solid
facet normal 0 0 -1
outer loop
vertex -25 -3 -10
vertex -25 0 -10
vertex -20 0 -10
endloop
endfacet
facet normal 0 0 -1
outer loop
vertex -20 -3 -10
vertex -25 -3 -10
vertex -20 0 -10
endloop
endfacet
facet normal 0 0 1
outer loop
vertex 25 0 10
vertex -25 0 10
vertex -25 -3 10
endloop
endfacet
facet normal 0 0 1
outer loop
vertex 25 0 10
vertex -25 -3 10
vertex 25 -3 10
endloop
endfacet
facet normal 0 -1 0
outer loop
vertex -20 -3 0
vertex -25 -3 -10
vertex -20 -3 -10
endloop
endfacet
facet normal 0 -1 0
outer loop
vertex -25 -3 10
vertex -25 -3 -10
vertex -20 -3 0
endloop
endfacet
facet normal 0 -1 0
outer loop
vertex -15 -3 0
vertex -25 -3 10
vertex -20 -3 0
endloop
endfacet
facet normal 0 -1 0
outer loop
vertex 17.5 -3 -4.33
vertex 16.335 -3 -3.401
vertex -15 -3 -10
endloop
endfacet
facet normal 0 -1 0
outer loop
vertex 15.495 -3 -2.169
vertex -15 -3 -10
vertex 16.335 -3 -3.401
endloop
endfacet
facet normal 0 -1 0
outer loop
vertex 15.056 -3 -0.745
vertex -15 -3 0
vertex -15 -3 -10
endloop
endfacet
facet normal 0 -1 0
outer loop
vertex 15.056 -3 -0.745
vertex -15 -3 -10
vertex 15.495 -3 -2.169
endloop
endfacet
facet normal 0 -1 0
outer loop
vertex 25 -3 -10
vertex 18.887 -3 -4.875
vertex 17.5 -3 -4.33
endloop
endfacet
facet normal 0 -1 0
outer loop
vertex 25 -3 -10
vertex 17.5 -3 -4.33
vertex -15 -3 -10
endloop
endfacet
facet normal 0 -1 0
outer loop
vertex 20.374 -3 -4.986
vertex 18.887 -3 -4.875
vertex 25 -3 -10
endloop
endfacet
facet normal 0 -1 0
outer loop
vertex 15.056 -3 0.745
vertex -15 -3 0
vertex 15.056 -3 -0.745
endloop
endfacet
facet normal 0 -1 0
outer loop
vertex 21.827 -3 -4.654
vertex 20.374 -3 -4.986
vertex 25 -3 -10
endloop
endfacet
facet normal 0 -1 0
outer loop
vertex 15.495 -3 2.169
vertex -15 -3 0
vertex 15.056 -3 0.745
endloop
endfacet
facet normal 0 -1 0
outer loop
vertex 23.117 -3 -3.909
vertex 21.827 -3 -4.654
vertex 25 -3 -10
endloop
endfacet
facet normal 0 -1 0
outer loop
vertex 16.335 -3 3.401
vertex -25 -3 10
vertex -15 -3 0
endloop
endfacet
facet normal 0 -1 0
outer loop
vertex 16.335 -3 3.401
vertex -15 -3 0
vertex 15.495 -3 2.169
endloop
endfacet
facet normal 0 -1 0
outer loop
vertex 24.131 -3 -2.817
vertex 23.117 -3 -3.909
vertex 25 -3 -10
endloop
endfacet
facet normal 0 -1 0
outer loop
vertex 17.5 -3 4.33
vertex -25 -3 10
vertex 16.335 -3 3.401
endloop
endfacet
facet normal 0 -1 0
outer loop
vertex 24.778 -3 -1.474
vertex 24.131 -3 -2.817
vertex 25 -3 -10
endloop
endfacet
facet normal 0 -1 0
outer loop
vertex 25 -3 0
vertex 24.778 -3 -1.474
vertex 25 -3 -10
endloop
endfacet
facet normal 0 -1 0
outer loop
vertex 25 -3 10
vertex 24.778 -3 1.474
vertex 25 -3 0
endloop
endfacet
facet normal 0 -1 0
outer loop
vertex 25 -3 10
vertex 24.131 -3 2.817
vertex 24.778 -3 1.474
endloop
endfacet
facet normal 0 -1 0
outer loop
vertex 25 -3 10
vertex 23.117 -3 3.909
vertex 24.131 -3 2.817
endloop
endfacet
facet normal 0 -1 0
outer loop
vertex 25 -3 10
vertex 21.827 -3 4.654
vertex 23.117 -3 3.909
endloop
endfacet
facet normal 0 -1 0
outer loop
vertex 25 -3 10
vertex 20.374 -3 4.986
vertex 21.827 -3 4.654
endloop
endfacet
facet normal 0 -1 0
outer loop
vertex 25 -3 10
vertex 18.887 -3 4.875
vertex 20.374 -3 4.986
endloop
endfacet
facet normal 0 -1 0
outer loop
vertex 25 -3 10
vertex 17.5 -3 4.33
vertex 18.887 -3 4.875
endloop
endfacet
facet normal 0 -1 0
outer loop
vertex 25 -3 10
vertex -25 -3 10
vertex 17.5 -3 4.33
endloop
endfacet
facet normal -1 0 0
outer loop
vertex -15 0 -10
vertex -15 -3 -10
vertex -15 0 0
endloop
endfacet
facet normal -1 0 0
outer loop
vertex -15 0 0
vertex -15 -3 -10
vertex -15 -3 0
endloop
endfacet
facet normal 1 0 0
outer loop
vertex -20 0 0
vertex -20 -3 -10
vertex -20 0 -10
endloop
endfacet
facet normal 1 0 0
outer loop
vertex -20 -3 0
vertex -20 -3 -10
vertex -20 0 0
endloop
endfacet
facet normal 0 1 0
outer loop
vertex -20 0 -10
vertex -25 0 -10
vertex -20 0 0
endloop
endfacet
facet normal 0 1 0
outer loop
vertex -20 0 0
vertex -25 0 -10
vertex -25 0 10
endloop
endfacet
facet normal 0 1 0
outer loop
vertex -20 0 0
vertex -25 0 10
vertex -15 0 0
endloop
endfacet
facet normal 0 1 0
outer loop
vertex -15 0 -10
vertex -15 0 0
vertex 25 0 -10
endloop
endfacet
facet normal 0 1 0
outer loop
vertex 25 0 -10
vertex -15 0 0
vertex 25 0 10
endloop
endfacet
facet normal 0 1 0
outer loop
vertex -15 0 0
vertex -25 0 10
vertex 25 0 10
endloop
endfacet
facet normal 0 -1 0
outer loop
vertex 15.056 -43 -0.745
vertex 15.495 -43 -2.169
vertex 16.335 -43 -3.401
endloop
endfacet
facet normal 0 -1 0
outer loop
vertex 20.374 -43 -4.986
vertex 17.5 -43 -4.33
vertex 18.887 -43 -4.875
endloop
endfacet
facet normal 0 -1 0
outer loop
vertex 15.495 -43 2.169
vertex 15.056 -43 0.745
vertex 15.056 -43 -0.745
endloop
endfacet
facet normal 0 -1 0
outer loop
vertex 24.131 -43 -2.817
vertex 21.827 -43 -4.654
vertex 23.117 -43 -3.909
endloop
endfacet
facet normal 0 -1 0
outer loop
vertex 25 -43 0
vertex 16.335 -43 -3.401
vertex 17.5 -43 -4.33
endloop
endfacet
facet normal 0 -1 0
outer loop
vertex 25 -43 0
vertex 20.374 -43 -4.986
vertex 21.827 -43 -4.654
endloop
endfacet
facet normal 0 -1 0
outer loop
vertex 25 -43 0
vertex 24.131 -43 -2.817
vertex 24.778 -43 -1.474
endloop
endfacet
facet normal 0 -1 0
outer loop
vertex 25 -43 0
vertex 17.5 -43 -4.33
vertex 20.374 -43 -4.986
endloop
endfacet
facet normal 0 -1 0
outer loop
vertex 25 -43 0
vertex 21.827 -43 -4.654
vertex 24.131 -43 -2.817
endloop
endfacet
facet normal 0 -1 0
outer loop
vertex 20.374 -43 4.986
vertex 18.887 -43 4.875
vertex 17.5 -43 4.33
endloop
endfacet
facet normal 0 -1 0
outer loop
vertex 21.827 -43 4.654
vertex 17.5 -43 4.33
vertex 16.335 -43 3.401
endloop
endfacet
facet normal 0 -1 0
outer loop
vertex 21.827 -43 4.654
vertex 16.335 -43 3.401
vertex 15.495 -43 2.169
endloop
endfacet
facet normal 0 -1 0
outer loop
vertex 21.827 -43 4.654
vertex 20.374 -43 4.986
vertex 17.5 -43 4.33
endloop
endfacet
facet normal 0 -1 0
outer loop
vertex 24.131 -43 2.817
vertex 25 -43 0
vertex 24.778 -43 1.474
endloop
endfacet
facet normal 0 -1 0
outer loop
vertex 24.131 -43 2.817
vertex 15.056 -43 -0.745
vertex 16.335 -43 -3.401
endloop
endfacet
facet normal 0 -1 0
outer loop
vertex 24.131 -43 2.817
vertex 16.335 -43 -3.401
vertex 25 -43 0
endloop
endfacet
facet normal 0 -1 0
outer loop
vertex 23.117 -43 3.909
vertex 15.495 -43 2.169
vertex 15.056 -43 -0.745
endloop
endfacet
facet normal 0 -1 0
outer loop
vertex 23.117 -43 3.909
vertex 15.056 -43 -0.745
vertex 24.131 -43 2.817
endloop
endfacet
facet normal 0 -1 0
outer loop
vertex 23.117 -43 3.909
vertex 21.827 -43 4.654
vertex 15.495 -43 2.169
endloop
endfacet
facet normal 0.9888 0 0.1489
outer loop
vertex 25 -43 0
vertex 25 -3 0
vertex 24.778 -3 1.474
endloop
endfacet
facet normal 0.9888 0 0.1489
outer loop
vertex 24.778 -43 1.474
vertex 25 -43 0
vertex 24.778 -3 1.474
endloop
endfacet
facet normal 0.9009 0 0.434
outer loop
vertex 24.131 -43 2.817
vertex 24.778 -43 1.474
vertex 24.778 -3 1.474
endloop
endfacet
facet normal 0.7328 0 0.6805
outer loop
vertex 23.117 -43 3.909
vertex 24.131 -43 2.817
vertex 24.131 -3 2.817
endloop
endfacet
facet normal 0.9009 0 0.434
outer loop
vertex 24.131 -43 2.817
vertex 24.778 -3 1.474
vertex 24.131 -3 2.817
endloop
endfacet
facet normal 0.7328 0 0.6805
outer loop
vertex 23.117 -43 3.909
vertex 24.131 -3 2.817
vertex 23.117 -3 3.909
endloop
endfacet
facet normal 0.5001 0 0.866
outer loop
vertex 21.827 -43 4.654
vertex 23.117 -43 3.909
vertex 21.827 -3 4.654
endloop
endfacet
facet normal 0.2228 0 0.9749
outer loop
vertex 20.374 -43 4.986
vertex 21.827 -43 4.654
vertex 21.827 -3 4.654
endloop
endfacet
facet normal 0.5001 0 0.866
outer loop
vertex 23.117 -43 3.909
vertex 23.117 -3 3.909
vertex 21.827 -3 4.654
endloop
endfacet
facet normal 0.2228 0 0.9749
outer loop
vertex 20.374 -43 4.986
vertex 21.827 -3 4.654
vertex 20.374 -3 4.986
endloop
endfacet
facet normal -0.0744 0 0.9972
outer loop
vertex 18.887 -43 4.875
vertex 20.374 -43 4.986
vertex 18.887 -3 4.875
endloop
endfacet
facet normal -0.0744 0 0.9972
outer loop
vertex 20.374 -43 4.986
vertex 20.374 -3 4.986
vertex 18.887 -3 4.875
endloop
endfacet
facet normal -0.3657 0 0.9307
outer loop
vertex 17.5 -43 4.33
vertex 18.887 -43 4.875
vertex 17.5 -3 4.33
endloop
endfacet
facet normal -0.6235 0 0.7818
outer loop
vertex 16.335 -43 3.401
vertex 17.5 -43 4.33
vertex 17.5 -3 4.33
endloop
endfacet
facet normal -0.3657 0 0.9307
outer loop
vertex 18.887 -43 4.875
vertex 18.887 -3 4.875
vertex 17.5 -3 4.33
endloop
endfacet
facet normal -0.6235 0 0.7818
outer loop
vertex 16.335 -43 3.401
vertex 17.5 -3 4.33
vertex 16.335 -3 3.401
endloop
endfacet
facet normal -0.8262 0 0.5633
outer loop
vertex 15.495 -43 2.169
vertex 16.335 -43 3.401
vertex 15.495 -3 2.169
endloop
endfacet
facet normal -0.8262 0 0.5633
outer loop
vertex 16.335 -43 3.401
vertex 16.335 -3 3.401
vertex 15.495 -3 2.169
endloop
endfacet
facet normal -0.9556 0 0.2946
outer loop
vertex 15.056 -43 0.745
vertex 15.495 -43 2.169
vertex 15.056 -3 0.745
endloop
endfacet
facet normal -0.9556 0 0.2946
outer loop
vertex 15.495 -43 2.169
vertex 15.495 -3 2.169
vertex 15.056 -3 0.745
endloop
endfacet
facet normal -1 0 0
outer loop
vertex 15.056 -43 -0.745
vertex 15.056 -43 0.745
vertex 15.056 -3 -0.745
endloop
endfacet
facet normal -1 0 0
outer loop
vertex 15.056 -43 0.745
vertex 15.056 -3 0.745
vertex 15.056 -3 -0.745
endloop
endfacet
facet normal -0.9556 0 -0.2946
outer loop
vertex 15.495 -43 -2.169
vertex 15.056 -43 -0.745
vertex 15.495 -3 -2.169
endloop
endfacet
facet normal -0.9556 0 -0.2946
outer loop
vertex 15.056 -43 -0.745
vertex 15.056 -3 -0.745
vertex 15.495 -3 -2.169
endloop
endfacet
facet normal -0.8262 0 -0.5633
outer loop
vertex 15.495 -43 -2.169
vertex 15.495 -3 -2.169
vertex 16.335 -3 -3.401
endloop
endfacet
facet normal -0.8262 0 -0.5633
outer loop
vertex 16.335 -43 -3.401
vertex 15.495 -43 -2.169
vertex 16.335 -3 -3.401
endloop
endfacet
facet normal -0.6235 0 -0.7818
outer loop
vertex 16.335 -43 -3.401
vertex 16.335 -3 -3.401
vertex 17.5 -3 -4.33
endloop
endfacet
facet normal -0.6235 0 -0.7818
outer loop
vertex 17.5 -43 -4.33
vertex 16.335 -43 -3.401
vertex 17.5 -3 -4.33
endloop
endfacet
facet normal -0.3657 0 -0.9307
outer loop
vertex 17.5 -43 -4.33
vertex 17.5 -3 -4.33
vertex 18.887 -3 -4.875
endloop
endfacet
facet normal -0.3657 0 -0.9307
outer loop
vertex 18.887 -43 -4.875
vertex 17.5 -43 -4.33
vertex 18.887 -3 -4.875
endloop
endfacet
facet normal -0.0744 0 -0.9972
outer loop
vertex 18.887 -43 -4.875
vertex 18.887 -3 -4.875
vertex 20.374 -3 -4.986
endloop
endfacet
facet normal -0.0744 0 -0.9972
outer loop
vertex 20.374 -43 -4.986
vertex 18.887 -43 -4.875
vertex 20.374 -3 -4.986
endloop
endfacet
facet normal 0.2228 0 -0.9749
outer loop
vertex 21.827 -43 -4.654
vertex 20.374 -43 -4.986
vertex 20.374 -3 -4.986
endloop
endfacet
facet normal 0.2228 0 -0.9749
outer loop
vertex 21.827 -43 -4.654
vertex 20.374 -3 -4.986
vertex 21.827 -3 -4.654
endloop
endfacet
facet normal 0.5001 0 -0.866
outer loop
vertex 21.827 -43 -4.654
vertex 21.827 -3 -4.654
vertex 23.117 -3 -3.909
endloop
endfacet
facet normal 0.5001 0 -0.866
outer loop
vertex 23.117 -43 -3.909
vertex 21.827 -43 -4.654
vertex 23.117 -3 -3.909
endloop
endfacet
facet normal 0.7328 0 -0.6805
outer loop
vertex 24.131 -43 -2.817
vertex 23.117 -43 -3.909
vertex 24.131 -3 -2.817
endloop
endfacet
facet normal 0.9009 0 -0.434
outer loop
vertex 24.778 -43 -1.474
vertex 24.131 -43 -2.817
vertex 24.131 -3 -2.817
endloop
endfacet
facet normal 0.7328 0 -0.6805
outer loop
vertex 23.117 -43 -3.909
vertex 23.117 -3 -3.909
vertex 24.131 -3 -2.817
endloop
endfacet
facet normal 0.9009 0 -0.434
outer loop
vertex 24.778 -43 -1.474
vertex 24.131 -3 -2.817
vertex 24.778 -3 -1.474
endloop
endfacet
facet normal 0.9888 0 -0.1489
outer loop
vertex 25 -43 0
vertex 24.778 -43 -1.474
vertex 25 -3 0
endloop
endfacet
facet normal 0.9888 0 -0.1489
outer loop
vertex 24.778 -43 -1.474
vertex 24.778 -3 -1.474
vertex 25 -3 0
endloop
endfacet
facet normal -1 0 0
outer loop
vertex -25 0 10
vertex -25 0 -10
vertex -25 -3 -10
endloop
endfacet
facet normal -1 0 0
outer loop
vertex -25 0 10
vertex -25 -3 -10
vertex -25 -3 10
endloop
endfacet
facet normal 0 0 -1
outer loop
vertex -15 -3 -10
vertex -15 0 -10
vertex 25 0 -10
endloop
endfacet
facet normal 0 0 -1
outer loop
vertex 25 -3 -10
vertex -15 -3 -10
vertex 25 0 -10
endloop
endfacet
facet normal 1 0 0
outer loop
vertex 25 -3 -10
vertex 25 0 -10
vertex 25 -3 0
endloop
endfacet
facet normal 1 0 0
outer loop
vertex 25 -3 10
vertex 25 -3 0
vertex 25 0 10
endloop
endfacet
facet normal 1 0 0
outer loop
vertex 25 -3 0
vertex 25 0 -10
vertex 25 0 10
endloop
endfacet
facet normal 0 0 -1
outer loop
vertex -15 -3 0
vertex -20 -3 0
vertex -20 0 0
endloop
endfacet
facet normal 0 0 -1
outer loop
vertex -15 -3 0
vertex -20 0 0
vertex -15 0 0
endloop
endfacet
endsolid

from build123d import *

# Parameters (mm, degrees)
F0_W     = 50
F0_H     = 20
F1_DEPTH = 3
F2_R     = 5
F3_DEPTH = 40
F4_W     = 5
F4_H     = 10.295372
F5_DEPTH = 3.001


with BuildPart() as f1:
    # F0 (on Front) → F1 (new body)
    with BuildSketch(Plane.XZ):
        Rectangle(F0_W, F0_H)
    extrude(amount=F1_DEPTH)

    # F2 (on face) → F3 (join)
    with BuildSketch(Plane.XZ.offset(3)):
        with Locations((20, 0)):
            Circle(F2_R)
    extrude(amount=F3_DEPTH)

    # F4 (on face) → F5 (cut, through all)
    with BuildSketch(Plane.XZ.offset(3)):
        with Locations((-17.5, -5.147686)):
            Rectangle(F4_W, F4_H)
    extrude(amount=-F5_DEPTH, mode=Mode.SUBTRACT)


solid = f1.part
